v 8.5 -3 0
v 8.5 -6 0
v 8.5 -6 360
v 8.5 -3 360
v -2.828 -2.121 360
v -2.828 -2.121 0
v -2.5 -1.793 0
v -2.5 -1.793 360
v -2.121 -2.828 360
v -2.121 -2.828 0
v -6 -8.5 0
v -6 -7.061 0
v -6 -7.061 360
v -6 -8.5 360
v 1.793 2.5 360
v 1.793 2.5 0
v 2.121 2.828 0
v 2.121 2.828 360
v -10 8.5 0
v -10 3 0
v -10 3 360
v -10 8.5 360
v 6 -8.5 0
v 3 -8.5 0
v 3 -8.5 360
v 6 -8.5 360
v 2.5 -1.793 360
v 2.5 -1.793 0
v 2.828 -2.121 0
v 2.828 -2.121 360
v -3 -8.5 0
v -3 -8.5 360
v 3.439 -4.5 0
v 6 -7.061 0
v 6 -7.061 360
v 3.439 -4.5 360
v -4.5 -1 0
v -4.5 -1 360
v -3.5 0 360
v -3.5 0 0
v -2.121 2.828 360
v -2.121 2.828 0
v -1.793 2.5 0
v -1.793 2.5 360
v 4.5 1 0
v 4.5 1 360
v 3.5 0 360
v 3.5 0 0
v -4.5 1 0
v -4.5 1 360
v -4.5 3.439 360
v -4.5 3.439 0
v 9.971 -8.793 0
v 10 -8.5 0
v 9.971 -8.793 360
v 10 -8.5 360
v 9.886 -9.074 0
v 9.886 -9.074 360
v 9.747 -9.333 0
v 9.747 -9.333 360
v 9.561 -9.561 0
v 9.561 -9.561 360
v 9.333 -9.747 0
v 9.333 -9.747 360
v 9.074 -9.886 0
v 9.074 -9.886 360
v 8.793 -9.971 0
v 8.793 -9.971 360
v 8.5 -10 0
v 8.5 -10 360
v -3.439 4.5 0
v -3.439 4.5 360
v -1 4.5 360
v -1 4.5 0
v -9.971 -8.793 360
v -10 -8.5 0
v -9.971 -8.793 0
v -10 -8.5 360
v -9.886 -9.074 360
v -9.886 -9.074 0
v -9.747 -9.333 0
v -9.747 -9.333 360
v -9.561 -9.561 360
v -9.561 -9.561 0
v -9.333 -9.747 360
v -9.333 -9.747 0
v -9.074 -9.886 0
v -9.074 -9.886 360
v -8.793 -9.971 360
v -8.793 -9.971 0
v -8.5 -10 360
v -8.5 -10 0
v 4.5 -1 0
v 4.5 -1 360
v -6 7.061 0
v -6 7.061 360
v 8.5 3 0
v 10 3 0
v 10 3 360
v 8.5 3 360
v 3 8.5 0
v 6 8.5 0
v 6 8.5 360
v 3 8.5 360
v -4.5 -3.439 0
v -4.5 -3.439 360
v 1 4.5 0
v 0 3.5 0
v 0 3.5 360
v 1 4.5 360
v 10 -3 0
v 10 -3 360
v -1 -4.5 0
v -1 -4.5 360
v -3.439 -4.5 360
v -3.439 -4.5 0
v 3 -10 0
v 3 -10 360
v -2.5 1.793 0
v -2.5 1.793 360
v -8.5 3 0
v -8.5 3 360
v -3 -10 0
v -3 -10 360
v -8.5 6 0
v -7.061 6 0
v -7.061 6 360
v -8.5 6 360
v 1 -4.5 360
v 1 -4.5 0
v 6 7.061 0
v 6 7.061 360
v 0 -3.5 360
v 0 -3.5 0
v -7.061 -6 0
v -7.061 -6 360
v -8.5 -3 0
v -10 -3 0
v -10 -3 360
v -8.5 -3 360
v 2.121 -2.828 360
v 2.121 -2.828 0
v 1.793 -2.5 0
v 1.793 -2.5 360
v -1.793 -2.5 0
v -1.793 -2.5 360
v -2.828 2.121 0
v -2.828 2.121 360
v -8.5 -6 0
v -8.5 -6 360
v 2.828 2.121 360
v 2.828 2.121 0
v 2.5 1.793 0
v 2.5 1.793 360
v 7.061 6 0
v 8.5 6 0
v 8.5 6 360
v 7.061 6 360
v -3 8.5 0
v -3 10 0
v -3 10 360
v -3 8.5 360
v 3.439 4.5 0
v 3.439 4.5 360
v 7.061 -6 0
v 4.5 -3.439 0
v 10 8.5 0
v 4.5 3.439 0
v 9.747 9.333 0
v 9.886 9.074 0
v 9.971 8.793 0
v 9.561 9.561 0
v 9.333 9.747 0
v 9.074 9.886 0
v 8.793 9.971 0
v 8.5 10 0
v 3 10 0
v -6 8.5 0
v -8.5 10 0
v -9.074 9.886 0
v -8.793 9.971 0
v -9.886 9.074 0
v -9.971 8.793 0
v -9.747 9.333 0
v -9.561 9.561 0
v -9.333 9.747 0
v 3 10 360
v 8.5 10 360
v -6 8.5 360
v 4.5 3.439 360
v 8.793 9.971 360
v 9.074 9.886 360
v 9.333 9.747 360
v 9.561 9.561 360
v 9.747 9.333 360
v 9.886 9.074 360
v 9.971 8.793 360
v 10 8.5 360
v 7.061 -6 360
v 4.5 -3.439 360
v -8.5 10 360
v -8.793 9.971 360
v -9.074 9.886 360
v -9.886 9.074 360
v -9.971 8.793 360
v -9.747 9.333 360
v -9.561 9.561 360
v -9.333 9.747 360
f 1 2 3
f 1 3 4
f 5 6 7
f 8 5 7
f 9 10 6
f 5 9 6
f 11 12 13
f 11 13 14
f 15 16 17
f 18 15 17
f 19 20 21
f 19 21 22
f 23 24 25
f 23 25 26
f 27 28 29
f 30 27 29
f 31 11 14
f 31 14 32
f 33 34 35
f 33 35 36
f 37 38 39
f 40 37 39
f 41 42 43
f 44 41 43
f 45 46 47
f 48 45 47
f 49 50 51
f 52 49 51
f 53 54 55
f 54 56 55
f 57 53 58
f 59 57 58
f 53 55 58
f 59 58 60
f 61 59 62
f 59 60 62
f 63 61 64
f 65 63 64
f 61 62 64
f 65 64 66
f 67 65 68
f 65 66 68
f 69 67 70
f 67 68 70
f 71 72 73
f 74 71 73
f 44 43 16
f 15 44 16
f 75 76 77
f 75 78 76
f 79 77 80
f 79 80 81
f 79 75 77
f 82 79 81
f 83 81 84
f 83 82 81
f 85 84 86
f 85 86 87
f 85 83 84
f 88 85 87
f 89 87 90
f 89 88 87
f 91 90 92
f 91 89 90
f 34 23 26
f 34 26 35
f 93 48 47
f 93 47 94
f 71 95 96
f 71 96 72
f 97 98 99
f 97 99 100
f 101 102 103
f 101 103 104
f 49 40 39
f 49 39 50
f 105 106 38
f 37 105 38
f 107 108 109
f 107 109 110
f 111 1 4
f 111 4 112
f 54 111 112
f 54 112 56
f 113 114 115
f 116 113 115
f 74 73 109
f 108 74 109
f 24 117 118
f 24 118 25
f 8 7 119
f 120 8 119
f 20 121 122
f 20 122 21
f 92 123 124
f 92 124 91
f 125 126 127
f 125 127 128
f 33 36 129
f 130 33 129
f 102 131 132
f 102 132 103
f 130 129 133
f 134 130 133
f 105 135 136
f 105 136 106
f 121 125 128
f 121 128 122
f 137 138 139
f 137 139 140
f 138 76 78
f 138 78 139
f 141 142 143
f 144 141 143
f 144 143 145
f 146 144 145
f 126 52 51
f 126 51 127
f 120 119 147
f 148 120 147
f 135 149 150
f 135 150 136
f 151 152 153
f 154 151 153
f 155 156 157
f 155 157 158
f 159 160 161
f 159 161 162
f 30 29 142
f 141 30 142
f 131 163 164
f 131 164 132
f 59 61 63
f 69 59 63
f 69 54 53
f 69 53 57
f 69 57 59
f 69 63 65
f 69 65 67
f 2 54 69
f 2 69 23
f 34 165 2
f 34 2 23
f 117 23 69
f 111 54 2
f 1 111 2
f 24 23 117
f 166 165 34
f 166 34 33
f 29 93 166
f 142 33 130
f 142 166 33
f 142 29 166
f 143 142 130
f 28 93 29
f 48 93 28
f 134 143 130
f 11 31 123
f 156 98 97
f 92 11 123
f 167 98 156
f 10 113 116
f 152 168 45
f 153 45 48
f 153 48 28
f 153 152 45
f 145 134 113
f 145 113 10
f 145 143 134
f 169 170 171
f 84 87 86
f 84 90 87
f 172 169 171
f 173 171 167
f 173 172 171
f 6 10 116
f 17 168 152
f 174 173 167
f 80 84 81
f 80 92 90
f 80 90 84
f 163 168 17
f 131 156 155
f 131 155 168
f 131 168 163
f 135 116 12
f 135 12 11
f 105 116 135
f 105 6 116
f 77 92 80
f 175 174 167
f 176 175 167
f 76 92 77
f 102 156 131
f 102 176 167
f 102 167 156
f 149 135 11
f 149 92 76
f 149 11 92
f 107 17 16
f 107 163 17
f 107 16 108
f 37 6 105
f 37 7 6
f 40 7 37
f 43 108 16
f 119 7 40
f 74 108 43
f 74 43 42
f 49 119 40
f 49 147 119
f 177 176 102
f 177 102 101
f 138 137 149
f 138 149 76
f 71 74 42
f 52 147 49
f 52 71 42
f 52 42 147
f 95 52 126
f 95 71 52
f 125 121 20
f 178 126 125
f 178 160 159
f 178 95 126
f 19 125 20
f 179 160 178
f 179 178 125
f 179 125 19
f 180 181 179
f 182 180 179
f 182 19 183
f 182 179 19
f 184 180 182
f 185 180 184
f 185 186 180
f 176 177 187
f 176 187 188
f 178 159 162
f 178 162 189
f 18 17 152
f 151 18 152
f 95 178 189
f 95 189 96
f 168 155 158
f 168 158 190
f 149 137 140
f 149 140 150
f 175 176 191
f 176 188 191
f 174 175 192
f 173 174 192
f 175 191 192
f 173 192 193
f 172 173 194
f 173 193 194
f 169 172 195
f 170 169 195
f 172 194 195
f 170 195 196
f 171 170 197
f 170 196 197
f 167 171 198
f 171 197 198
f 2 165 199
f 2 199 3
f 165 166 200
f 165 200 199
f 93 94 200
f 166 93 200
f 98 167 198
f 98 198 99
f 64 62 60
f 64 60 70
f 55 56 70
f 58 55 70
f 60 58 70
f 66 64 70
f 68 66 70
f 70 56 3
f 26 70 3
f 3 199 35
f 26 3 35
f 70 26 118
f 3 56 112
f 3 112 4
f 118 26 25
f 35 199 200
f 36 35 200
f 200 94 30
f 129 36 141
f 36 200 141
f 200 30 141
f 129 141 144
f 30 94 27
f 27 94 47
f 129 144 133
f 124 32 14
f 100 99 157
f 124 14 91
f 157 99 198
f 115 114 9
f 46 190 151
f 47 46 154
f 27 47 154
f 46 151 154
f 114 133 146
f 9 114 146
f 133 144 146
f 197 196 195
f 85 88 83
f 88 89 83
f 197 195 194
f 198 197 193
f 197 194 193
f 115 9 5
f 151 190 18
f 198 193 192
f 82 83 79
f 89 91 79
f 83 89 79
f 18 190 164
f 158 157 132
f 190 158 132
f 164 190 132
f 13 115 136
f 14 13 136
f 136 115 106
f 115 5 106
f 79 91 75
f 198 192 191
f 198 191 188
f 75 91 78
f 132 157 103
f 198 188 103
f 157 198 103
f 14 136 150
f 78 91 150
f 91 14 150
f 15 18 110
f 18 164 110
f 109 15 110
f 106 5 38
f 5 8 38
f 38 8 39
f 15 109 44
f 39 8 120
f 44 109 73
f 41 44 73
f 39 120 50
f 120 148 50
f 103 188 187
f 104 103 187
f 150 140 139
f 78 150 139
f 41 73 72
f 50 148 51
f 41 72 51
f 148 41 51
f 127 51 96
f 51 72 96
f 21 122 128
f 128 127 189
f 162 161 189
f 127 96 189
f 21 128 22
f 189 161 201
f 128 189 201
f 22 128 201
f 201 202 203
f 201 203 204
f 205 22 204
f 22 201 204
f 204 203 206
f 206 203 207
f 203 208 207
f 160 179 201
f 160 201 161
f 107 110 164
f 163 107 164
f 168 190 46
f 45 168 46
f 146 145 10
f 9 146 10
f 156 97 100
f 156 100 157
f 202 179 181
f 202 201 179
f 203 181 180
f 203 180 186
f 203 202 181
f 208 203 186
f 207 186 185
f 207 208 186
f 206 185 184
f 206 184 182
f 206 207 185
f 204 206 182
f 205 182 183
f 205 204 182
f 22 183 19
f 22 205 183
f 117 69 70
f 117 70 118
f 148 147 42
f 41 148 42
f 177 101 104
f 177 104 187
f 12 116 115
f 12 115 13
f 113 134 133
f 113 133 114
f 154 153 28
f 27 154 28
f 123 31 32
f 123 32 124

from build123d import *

# Parameters (mm, degrees)
BOSS_EXTRUDE1_DEPTH = 360
FILLET1_R           = 1.5


with BuildPart() as part:
    # Sketch1 → Boss-Extrude1 (new body)
    with BuildSketch(Plane.XY):
        Polygon((0, 3.5), (1, 4.5), (3.439339828, 4.5), (6, 7.060660172), (6, 8.5), (3, 8.5), (3, 10), (10, 10), (10, 3), (8.5, 3), (8.5, 6), (7.060660172, 6), (4.5, 3.439339828), (4.5, 1), (3.5, 0), (4.5, -1), (4.5, -3.439339828), (7.060660172, -6), (8.5, -6), (8.5, -3), (10, -3), (10, -10), (3, -10), (3, -8.5), (6, -8.5), (6, -7.060660172), (3.439339828, -4.5), (1, -4.5), (0, -3.5), (-1, -4.5), (-3.439339828, -4.5), (-6, -7.060660172), (-6, -8.5), (-3, -8.5), (-3, -10), (-10, -10), (-10, -3), (-8.5, -3), (-8.5, -6), (-7.060660172, -6), (-4.5, -3.439339828), (-4.5, -1), (-3.5, 0), (-4.5, 1), (-4.5, 3.439339828), (-7.060660172, 6), (-8.5, 6), (-8.5, 3), (-10, 3), (-10, 10), (-3, 10), (-3, 8.5), (-6, 8.5), (-6, 7.060660172), (-3.439339828, 4.5), (-1, 4.5), align=None)
        Polygon((-1.792893219, 2.5), (1.792893219, 2.5), (2.121320344, 2.828427125), (2.828427125, 2.121320344), (2.5, 1.792893219), (2.5, -1.792893219), (2.828427125, -2.121320344), (2.121320344, -2.828427125), (1.792893219, -2.5), (-1.792893219, -2.5), (-2.121320344, -2.828427125), (-2.828427125, -2.121320344), (-2.5, -1.792893219), (-2.5, 1.792893219), (-2.828427125, 2.121320344), (-2.121320344, 2.828427125), align=None, mode=Mode.SUBTRACT)
    extrude(amount=BOSS_EXTRUDE1_DEPTH)

    # Fillet1
    fillet1_edges = [part.edges().sort_by_distance(p)[0] for p in [
        (10, 10, 180),
        (10, -10, 180),
        (-10, -10, 180),
        (-10, 10, 180),
    ]]
    fillet(fillet1_edges, radius=FILLET1_R)


solid = part.part
